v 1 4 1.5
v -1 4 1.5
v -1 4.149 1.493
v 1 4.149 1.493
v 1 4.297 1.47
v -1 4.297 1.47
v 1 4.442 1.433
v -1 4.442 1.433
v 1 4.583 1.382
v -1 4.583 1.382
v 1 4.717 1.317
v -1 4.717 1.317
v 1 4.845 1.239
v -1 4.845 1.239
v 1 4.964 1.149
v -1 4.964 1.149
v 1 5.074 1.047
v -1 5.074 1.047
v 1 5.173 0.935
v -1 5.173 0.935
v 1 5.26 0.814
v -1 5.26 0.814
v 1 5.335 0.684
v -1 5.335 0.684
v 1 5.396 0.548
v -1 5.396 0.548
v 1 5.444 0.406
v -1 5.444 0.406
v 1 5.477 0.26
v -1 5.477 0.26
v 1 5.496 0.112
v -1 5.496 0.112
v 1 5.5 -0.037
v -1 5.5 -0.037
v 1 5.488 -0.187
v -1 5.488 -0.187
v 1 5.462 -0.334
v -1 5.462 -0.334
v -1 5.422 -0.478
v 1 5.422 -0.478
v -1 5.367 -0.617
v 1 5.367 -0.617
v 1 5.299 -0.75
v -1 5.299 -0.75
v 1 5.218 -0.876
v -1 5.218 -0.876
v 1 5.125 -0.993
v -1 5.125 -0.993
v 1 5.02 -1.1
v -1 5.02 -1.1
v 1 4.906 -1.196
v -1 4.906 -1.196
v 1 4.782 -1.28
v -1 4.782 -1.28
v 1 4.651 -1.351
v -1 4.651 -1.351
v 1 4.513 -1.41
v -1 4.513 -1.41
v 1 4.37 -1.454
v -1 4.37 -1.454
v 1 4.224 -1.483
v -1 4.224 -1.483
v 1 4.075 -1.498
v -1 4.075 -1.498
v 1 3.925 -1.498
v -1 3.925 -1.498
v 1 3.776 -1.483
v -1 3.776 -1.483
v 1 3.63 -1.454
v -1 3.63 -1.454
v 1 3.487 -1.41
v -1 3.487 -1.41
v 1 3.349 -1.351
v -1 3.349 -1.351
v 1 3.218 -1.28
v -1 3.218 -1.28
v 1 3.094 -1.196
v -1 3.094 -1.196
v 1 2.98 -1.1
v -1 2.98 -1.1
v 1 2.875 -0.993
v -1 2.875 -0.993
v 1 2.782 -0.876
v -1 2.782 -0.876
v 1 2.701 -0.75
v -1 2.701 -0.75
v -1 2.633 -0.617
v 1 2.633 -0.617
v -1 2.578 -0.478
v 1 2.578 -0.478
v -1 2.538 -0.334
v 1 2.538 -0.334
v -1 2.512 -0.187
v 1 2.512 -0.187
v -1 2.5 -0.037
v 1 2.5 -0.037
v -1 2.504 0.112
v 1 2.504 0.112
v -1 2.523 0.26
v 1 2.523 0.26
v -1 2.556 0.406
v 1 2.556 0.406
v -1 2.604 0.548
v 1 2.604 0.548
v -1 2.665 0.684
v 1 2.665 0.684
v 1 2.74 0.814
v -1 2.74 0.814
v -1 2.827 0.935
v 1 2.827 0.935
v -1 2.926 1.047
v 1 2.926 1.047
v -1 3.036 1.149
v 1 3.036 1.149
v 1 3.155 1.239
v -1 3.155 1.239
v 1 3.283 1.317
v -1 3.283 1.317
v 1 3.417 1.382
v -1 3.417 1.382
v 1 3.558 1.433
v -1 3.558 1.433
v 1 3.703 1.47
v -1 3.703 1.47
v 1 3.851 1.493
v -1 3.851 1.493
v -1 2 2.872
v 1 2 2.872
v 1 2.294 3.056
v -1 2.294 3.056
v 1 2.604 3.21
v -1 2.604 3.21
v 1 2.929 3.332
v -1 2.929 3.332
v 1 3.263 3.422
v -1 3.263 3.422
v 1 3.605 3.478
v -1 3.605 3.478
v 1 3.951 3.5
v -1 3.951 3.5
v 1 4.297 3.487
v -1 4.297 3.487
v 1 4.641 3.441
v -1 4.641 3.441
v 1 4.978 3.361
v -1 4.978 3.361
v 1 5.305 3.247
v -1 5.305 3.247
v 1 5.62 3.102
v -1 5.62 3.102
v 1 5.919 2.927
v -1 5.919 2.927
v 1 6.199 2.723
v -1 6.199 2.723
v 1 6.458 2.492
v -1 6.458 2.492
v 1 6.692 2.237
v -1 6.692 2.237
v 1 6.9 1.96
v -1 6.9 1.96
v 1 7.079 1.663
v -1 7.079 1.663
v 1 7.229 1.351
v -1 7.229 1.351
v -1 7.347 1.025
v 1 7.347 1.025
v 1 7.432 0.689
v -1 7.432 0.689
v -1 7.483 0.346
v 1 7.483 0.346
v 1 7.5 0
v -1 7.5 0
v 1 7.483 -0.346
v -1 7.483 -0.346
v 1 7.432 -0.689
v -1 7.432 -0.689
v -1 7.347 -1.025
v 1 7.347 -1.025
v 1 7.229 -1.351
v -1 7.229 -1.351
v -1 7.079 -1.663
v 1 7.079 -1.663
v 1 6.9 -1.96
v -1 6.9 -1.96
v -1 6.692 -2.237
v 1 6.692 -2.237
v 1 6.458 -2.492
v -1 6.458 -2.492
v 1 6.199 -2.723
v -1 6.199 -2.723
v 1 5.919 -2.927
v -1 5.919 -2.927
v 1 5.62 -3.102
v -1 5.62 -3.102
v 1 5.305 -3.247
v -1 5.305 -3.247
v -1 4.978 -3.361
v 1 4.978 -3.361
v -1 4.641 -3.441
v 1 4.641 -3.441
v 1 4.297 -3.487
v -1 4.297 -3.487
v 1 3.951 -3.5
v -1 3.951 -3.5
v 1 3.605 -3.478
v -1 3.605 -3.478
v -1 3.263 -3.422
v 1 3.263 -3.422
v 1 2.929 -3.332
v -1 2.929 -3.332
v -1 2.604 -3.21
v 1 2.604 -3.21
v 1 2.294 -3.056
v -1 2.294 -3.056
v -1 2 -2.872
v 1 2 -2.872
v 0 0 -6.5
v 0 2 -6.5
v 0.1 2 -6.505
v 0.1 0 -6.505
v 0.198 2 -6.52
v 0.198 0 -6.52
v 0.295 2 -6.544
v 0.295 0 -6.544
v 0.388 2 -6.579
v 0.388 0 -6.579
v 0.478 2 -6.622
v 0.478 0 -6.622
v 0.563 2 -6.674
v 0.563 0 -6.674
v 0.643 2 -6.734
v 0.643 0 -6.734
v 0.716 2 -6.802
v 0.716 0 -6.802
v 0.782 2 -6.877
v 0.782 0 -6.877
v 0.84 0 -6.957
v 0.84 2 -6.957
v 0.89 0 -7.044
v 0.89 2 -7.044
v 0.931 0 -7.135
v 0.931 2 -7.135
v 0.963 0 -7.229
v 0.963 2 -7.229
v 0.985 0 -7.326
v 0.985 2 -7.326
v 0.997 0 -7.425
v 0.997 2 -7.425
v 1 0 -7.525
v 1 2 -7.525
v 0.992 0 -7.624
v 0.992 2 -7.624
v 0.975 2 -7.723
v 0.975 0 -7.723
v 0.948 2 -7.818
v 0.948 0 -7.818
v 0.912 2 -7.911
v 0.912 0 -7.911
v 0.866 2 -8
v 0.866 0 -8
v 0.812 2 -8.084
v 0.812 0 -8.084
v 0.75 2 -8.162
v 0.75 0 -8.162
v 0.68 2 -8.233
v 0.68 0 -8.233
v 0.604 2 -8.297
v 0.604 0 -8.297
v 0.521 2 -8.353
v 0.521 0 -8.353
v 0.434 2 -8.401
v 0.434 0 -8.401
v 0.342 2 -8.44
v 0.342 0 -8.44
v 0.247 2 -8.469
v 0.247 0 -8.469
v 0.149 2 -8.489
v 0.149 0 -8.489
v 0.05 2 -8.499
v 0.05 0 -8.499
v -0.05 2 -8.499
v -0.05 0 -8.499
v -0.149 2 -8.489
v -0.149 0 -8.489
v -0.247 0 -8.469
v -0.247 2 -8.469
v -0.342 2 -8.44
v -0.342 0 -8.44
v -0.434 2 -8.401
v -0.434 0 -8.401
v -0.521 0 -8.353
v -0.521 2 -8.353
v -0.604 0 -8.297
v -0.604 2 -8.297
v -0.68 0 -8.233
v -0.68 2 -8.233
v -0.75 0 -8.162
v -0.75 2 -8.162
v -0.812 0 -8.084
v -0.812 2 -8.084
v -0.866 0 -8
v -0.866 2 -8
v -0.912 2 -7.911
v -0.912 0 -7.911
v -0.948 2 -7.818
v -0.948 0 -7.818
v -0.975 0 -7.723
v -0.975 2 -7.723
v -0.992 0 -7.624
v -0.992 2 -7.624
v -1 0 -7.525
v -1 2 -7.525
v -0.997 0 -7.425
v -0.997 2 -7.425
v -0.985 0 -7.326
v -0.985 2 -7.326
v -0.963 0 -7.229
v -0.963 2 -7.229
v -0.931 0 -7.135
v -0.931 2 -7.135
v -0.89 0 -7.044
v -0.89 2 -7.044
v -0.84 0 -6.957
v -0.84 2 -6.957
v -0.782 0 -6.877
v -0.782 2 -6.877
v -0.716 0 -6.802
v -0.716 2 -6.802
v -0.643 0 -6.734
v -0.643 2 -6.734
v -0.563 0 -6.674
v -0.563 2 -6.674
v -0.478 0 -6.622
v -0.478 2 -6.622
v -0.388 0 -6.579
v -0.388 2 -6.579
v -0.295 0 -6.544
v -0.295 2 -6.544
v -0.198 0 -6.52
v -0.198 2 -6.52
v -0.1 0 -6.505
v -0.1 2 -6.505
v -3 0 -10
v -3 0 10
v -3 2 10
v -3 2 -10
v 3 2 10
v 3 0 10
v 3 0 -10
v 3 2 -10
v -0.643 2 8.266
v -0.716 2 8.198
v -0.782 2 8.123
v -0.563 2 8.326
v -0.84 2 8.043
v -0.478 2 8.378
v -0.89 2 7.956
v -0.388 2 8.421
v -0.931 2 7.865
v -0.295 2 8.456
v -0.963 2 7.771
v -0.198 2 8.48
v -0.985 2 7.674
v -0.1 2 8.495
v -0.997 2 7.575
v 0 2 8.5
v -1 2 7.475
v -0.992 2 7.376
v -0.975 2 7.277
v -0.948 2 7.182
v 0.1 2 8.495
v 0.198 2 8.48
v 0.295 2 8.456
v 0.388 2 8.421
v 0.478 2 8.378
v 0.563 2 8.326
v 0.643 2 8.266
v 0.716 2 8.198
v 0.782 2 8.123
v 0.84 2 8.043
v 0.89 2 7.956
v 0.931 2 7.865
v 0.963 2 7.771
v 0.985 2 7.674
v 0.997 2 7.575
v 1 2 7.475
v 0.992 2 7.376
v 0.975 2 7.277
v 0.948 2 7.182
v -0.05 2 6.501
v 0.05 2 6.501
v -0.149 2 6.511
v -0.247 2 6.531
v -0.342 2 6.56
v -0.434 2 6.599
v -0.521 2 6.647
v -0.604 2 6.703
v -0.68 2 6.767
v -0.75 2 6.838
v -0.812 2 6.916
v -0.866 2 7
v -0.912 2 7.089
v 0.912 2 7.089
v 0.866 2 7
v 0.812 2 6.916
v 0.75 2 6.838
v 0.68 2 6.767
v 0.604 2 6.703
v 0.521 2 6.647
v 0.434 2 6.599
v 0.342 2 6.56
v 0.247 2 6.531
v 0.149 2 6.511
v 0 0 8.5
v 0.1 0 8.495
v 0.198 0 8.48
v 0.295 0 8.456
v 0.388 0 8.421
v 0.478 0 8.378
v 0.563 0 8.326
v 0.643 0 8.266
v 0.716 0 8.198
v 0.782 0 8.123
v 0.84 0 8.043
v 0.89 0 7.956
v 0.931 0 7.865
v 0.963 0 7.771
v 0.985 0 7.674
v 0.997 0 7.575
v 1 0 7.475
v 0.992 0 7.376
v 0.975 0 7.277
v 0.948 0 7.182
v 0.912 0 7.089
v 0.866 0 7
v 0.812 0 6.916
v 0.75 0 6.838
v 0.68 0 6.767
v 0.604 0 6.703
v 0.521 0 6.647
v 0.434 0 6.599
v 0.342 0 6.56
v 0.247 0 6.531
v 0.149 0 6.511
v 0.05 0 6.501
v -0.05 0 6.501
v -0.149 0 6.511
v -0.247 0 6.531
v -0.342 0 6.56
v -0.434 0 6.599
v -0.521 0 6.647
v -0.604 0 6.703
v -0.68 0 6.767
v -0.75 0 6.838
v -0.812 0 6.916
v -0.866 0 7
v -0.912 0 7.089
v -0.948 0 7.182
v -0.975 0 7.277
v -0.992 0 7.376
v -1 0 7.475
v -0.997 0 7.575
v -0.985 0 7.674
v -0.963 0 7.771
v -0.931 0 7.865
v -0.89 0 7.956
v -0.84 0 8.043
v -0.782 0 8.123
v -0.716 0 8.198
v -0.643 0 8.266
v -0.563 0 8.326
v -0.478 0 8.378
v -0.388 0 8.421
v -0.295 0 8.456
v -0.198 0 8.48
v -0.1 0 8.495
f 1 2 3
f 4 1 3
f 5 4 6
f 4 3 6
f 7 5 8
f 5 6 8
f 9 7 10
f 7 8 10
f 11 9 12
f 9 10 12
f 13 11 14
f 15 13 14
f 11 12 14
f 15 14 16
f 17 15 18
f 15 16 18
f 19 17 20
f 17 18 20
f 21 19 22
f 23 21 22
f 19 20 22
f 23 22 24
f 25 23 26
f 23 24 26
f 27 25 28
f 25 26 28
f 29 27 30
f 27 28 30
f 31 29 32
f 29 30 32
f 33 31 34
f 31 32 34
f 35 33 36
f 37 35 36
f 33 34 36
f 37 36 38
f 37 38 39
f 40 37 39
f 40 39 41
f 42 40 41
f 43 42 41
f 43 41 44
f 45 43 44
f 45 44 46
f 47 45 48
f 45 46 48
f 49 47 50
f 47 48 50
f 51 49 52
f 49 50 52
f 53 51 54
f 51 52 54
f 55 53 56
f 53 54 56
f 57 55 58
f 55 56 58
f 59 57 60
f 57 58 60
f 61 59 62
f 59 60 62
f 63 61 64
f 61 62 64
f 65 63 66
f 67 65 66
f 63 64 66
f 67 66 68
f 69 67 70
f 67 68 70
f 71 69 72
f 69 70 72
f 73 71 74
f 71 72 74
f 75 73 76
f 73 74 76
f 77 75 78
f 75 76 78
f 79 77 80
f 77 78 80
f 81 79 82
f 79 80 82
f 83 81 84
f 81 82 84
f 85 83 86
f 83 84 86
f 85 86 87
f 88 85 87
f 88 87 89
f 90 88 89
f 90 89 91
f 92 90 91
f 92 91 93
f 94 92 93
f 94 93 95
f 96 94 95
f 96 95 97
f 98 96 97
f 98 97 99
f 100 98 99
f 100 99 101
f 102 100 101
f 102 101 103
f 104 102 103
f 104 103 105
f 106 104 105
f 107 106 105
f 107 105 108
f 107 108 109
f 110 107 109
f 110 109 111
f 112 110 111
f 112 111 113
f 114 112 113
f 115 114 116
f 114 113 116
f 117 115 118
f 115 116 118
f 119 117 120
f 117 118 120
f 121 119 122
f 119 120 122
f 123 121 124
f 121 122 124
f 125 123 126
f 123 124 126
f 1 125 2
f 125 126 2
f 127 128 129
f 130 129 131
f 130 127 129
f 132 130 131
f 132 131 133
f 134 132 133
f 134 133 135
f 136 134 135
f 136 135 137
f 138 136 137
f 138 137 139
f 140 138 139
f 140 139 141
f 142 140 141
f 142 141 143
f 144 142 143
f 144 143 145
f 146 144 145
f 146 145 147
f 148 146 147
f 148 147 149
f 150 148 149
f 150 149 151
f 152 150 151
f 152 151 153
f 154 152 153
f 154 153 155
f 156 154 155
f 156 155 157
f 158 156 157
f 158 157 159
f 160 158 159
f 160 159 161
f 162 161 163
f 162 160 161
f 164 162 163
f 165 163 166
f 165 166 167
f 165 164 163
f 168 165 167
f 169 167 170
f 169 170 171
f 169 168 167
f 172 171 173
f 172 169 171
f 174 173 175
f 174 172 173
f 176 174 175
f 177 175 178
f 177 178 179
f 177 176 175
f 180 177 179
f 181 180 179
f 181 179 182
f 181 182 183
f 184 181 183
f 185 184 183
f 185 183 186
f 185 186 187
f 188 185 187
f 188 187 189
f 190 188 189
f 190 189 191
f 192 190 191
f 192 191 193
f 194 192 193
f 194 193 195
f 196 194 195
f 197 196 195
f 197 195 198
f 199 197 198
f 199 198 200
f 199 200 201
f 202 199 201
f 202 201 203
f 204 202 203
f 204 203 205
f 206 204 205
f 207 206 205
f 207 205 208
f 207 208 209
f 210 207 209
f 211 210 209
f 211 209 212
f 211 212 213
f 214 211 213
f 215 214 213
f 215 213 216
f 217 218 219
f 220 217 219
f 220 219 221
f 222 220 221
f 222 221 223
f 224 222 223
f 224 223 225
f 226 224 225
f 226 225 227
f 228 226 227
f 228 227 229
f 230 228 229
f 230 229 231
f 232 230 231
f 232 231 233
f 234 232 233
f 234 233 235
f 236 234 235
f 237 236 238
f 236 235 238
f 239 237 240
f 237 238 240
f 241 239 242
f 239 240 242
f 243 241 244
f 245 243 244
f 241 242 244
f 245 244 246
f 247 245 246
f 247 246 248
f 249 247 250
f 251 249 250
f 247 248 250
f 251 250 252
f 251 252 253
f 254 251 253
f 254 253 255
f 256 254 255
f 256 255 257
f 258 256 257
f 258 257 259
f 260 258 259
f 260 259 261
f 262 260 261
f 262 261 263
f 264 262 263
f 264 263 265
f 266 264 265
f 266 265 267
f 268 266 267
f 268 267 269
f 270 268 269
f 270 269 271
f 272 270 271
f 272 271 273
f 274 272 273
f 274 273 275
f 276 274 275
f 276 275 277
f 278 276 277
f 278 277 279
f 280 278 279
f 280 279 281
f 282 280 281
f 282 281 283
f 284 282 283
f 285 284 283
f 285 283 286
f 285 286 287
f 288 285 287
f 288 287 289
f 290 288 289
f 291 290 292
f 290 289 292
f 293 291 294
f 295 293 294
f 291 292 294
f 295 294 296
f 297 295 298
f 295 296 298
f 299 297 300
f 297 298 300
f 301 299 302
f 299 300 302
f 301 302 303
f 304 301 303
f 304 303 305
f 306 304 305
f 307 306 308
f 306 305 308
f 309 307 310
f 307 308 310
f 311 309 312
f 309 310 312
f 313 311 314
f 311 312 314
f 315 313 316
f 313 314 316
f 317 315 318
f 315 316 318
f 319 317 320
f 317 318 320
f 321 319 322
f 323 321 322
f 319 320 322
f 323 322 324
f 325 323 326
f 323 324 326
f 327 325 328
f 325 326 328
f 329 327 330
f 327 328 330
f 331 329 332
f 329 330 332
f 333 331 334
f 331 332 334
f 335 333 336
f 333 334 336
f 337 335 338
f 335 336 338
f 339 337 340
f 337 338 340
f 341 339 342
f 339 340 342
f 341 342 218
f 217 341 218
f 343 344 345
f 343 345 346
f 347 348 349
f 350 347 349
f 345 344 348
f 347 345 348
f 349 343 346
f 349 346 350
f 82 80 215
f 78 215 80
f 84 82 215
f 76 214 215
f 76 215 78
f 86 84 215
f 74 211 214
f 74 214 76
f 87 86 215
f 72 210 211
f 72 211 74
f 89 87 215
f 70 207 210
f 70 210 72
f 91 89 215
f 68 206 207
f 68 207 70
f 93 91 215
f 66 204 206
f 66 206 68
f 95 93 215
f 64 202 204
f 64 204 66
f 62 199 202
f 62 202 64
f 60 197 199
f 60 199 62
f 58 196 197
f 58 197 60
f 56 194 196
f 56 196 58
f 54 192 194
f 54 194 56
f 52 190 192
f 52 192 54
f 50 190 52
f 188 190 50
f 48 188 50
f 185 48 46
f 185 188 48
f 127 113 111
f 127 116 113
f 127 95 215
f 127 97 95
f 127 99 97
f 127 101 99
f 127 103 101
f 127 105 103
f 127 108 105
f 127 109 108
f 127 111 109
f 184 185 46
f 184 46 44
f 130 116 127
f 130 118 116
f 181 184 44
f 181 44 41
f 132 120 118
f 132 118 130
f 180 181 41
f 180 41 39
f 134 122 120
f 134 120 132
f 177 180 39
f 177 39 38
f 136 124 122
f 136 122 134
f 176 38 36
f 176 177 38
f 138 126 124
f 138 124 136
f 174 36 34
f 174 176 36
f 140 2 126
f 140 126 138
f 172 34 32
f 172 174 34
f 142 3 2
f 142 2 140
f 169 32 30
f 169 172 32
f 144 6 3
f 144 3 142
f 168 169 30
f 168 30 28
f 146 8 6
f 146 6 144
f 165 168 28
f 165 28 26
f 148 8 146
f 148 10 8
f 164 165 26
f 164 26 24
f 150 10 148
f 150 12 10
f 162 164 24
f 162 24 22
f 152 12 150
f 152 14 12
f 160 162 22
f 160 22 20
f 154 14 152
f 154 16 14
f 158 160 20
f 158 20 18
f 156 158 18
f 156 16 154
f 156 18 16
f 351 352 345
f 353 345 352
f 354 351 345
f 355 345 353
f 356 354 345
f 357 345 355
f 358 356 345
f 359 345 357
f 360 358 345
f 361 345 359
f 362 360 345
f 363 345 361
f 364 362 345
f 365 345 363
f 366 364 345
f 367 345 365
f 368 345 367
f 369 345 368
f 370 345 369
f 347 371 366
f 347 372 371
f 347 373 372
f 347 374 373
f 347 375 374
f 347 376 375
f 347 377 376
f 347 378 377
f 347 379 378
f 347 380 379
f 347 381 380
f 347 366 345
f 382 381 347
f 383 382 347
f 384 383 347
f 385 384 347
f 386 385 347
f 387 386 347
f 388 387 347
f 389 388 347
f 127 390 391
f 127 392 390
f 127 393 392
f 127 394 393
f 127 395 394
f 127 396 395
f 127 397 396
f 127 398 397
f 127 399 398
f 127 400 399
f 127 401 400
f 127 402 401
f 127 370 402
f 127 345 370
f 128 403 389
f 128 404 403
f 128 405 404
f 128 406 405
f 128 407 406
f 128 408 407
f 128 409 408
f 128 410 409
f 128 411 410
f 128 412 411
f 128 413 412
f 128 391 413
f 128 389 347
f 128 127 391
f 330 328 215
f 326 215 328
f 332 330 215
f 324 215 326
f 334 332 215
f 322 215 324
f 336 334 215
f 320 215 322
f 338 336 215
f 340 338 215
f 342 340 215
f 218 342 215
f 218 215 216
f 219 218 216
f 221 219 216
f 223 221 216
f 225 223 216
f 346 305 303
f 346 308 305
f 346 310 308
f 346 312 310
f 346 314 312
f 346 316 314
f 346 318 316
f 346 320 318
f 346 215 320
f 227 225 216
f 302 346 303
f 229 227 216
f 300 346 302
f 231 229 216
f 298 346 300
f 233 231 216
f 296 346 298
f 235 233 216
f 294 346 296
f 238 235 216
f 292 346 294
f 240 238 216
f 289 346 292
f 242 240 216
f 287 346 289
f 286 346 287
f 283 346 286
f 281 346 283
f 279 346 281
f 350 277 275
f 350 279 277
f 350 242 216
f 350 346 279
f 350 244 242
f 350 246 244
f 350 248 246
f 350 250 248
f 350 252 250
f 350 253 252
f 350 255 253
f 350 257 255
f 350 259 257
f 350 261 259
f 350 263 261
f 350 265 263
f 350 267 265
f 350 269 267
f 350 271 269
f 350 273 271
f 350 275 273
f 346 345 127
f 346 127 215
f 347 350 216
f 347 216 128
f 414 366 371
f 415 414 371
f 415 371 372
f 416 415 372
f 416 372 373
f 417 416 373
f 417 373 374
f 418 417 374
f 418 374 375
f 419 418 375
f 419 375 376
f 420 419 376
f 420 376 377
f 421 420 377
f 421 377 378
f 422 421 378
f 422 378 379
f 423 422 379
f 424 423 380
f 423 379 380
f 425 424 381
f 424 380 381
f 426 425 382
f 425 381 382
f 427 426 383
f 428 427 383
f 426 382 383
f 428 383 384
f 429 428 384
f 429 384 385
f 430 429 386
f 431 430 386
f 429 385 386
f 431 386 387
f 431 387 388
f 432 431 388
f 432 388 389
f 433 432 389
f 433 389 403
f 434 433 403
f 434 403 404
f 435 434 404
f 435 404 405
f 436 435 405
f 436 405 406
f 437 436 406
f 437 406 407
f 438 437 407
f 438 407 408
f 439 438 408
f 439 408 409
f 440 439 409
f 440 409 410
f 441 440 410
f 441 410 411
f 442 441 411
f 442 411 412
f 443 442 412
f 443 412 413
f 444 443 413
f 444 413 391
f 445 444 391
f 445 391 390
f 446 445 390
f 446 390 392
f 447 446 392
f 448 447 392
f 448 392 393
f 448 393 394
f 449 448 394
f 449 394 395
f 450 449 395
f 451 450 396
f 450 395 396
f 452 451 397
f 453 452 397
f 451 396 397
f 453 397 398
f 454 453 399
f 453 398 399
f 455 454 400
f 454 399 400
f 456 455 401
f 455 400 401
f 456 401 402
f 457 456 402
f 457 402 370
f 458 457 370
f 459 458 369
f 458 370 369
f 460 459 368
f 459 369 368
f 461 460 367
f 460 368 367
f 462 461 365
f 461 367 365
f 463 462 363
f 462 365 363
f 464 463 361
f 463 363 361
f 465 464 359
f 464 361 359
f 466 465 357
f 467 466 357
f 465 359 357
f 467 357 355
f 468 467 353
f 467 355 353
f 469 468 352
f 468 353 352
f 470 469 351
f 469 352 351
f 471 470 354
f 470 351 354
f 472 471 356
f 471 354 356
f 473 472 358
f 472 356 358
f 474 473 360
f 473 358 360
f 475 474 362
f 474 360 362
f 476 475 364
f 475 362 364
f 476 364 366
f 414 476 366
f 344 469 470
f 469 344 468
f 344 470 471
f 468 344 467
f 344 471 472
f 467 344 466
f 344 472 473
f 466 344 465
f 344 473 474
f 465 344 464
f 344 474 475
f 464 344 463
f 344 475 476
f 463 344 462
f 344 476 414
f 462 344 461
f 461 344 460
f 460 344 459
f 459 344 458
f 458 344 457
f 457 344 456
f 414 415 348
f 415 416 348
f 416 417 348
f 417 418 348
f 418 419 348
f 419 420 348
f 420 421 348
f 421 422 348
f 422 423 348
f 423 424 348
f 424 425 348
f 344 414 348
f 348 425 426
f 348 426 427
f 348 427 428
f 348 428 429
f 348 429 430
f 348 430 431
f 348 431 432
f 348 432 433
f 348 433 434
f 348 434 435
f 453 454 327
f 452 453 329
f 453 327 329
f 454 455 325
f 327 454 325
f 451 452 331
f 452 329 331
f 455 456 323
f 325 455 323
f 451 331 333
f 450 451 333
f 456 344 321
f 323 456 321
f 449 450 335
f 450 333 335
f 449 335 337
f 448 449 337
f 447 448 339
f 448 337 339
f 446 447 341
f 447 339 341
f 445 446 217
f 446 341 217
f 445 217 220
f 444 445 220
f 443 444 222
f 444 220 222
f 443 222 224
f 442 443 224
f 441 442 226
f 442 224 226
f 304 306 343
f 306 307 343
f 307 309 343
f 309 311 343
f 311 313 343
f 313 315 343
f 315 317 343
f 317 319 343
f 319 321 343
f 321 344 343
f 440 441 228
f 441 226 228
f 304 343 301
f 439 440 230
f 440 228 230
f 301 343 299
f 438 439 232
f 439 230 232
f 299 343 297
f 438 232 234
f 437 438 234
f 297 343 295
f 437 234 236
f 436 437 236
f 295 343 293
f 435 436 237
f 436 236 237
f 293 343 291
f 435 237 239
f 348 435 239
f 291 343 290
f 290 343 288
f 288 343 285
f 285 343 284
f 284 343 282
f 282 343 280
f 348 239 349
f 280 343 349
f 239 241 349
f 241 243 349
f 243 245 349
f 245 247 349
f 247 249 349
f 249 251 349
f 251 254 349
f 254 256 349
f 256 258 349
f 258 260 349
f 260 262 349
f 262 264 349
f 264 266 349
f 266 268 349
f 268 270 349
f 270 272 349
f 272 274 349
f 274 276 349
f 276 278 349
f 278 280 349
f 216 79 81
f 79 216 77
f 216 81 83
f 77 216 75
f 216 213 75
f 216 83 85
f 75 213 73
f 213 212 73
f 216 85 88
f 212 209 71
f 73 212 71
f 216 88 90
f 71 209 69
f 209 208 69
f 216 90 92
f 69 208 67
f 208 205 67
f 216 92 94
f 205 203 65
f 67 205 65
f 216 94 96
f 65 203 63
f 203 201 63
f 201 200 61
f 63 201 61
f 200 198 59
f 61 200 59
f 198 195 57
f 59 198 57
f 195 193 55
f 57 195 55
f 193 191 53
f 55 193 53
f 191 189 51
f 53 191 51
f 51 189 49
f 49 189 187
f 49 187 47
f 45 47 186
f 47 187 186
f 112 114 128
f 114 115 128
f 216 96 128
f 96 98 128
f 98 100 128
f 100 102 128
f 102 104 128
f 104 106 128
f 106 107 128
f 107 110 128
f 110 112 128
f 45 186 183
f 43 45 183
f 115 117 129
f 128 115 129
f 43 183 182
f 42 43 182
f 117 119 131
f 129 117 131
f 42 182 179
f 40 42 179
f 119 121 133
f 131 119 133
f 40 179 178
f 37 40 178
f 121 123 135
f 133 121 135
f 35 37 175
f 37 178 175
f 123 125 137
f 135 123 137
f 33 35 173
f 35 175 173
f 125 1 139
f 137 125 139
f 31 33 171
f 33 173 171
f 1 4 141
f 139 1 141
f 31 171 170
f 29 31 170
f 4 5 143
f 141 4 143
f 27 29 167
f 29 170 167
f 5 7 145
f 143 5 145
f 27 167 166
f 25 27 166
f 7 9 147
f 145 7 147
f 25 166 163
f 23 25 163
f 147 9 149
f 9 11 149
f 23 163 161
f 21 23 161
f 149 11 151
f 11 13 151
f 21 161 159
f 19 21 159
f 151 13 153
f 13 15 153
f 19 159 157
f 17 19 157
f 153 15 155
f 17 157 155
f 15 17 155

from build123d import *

# Parameters (mm, degrees)
SKETCH_4_W          = 6
SKETCH_4_H          = 20
EXTRUDE_1_DEPTH     = 2
EXTRUDE_START       = -2
SKETCH_6_R          = 3.5
SKETCH_6_R_2        = 1.5
EXTRUDE_3_DEPTH     = 2
SKETCH_7_R          = 1
CUT_EXTRUDE_1_DEPTH = 12.800423721


with BuildPart() as part:
    # 草图4 → 凸台-拉伸1 (new body)
    with BuildSketch(Plane(origin=(0, 0, 0), x_dir=(1, 0, 0), z_dir=(0, 1, 0))):
        Rectangle(SKETCH_4_W, SKETCH_4_H)
    extrude(amount=EXTRUDE_1_DEPTH)

    # 草图6 → 凸台-拉伸3 (add)
    with BuildSketch(Plane.ZY.offset(3).offset(EXTRUDE_START)):
        with Locations((0, 4)):
            Circle(SKETCH_6_R)
        with Locations((0, 4)):
            Circle(SKETCH_6_R_2, mode=Mode.SUBTRACT)
    extrude(amount=-EXTRUDE_3_DEPTH)

    # 草图7 → 切除-拉伸1 (cut, through all)
    with BuildSketch(Plane(origin=(0, 2, 0), x_dir=(1, 0, 0), z_dir=(0, 1, 0))):
        with Locations(Location((0, -7.5, 0), (0, 0, 270))):
            Circle(SKETCH_7_R)
        with Locations(Location((0, 7.5, 0), (0, 0, 270))):
            Circle(SKETCH_7_R)
    extrude(amount=-CUT_EXTRUDE_1_DEPTH, mode=Mode.SUBTRACT)


solid = part.part
